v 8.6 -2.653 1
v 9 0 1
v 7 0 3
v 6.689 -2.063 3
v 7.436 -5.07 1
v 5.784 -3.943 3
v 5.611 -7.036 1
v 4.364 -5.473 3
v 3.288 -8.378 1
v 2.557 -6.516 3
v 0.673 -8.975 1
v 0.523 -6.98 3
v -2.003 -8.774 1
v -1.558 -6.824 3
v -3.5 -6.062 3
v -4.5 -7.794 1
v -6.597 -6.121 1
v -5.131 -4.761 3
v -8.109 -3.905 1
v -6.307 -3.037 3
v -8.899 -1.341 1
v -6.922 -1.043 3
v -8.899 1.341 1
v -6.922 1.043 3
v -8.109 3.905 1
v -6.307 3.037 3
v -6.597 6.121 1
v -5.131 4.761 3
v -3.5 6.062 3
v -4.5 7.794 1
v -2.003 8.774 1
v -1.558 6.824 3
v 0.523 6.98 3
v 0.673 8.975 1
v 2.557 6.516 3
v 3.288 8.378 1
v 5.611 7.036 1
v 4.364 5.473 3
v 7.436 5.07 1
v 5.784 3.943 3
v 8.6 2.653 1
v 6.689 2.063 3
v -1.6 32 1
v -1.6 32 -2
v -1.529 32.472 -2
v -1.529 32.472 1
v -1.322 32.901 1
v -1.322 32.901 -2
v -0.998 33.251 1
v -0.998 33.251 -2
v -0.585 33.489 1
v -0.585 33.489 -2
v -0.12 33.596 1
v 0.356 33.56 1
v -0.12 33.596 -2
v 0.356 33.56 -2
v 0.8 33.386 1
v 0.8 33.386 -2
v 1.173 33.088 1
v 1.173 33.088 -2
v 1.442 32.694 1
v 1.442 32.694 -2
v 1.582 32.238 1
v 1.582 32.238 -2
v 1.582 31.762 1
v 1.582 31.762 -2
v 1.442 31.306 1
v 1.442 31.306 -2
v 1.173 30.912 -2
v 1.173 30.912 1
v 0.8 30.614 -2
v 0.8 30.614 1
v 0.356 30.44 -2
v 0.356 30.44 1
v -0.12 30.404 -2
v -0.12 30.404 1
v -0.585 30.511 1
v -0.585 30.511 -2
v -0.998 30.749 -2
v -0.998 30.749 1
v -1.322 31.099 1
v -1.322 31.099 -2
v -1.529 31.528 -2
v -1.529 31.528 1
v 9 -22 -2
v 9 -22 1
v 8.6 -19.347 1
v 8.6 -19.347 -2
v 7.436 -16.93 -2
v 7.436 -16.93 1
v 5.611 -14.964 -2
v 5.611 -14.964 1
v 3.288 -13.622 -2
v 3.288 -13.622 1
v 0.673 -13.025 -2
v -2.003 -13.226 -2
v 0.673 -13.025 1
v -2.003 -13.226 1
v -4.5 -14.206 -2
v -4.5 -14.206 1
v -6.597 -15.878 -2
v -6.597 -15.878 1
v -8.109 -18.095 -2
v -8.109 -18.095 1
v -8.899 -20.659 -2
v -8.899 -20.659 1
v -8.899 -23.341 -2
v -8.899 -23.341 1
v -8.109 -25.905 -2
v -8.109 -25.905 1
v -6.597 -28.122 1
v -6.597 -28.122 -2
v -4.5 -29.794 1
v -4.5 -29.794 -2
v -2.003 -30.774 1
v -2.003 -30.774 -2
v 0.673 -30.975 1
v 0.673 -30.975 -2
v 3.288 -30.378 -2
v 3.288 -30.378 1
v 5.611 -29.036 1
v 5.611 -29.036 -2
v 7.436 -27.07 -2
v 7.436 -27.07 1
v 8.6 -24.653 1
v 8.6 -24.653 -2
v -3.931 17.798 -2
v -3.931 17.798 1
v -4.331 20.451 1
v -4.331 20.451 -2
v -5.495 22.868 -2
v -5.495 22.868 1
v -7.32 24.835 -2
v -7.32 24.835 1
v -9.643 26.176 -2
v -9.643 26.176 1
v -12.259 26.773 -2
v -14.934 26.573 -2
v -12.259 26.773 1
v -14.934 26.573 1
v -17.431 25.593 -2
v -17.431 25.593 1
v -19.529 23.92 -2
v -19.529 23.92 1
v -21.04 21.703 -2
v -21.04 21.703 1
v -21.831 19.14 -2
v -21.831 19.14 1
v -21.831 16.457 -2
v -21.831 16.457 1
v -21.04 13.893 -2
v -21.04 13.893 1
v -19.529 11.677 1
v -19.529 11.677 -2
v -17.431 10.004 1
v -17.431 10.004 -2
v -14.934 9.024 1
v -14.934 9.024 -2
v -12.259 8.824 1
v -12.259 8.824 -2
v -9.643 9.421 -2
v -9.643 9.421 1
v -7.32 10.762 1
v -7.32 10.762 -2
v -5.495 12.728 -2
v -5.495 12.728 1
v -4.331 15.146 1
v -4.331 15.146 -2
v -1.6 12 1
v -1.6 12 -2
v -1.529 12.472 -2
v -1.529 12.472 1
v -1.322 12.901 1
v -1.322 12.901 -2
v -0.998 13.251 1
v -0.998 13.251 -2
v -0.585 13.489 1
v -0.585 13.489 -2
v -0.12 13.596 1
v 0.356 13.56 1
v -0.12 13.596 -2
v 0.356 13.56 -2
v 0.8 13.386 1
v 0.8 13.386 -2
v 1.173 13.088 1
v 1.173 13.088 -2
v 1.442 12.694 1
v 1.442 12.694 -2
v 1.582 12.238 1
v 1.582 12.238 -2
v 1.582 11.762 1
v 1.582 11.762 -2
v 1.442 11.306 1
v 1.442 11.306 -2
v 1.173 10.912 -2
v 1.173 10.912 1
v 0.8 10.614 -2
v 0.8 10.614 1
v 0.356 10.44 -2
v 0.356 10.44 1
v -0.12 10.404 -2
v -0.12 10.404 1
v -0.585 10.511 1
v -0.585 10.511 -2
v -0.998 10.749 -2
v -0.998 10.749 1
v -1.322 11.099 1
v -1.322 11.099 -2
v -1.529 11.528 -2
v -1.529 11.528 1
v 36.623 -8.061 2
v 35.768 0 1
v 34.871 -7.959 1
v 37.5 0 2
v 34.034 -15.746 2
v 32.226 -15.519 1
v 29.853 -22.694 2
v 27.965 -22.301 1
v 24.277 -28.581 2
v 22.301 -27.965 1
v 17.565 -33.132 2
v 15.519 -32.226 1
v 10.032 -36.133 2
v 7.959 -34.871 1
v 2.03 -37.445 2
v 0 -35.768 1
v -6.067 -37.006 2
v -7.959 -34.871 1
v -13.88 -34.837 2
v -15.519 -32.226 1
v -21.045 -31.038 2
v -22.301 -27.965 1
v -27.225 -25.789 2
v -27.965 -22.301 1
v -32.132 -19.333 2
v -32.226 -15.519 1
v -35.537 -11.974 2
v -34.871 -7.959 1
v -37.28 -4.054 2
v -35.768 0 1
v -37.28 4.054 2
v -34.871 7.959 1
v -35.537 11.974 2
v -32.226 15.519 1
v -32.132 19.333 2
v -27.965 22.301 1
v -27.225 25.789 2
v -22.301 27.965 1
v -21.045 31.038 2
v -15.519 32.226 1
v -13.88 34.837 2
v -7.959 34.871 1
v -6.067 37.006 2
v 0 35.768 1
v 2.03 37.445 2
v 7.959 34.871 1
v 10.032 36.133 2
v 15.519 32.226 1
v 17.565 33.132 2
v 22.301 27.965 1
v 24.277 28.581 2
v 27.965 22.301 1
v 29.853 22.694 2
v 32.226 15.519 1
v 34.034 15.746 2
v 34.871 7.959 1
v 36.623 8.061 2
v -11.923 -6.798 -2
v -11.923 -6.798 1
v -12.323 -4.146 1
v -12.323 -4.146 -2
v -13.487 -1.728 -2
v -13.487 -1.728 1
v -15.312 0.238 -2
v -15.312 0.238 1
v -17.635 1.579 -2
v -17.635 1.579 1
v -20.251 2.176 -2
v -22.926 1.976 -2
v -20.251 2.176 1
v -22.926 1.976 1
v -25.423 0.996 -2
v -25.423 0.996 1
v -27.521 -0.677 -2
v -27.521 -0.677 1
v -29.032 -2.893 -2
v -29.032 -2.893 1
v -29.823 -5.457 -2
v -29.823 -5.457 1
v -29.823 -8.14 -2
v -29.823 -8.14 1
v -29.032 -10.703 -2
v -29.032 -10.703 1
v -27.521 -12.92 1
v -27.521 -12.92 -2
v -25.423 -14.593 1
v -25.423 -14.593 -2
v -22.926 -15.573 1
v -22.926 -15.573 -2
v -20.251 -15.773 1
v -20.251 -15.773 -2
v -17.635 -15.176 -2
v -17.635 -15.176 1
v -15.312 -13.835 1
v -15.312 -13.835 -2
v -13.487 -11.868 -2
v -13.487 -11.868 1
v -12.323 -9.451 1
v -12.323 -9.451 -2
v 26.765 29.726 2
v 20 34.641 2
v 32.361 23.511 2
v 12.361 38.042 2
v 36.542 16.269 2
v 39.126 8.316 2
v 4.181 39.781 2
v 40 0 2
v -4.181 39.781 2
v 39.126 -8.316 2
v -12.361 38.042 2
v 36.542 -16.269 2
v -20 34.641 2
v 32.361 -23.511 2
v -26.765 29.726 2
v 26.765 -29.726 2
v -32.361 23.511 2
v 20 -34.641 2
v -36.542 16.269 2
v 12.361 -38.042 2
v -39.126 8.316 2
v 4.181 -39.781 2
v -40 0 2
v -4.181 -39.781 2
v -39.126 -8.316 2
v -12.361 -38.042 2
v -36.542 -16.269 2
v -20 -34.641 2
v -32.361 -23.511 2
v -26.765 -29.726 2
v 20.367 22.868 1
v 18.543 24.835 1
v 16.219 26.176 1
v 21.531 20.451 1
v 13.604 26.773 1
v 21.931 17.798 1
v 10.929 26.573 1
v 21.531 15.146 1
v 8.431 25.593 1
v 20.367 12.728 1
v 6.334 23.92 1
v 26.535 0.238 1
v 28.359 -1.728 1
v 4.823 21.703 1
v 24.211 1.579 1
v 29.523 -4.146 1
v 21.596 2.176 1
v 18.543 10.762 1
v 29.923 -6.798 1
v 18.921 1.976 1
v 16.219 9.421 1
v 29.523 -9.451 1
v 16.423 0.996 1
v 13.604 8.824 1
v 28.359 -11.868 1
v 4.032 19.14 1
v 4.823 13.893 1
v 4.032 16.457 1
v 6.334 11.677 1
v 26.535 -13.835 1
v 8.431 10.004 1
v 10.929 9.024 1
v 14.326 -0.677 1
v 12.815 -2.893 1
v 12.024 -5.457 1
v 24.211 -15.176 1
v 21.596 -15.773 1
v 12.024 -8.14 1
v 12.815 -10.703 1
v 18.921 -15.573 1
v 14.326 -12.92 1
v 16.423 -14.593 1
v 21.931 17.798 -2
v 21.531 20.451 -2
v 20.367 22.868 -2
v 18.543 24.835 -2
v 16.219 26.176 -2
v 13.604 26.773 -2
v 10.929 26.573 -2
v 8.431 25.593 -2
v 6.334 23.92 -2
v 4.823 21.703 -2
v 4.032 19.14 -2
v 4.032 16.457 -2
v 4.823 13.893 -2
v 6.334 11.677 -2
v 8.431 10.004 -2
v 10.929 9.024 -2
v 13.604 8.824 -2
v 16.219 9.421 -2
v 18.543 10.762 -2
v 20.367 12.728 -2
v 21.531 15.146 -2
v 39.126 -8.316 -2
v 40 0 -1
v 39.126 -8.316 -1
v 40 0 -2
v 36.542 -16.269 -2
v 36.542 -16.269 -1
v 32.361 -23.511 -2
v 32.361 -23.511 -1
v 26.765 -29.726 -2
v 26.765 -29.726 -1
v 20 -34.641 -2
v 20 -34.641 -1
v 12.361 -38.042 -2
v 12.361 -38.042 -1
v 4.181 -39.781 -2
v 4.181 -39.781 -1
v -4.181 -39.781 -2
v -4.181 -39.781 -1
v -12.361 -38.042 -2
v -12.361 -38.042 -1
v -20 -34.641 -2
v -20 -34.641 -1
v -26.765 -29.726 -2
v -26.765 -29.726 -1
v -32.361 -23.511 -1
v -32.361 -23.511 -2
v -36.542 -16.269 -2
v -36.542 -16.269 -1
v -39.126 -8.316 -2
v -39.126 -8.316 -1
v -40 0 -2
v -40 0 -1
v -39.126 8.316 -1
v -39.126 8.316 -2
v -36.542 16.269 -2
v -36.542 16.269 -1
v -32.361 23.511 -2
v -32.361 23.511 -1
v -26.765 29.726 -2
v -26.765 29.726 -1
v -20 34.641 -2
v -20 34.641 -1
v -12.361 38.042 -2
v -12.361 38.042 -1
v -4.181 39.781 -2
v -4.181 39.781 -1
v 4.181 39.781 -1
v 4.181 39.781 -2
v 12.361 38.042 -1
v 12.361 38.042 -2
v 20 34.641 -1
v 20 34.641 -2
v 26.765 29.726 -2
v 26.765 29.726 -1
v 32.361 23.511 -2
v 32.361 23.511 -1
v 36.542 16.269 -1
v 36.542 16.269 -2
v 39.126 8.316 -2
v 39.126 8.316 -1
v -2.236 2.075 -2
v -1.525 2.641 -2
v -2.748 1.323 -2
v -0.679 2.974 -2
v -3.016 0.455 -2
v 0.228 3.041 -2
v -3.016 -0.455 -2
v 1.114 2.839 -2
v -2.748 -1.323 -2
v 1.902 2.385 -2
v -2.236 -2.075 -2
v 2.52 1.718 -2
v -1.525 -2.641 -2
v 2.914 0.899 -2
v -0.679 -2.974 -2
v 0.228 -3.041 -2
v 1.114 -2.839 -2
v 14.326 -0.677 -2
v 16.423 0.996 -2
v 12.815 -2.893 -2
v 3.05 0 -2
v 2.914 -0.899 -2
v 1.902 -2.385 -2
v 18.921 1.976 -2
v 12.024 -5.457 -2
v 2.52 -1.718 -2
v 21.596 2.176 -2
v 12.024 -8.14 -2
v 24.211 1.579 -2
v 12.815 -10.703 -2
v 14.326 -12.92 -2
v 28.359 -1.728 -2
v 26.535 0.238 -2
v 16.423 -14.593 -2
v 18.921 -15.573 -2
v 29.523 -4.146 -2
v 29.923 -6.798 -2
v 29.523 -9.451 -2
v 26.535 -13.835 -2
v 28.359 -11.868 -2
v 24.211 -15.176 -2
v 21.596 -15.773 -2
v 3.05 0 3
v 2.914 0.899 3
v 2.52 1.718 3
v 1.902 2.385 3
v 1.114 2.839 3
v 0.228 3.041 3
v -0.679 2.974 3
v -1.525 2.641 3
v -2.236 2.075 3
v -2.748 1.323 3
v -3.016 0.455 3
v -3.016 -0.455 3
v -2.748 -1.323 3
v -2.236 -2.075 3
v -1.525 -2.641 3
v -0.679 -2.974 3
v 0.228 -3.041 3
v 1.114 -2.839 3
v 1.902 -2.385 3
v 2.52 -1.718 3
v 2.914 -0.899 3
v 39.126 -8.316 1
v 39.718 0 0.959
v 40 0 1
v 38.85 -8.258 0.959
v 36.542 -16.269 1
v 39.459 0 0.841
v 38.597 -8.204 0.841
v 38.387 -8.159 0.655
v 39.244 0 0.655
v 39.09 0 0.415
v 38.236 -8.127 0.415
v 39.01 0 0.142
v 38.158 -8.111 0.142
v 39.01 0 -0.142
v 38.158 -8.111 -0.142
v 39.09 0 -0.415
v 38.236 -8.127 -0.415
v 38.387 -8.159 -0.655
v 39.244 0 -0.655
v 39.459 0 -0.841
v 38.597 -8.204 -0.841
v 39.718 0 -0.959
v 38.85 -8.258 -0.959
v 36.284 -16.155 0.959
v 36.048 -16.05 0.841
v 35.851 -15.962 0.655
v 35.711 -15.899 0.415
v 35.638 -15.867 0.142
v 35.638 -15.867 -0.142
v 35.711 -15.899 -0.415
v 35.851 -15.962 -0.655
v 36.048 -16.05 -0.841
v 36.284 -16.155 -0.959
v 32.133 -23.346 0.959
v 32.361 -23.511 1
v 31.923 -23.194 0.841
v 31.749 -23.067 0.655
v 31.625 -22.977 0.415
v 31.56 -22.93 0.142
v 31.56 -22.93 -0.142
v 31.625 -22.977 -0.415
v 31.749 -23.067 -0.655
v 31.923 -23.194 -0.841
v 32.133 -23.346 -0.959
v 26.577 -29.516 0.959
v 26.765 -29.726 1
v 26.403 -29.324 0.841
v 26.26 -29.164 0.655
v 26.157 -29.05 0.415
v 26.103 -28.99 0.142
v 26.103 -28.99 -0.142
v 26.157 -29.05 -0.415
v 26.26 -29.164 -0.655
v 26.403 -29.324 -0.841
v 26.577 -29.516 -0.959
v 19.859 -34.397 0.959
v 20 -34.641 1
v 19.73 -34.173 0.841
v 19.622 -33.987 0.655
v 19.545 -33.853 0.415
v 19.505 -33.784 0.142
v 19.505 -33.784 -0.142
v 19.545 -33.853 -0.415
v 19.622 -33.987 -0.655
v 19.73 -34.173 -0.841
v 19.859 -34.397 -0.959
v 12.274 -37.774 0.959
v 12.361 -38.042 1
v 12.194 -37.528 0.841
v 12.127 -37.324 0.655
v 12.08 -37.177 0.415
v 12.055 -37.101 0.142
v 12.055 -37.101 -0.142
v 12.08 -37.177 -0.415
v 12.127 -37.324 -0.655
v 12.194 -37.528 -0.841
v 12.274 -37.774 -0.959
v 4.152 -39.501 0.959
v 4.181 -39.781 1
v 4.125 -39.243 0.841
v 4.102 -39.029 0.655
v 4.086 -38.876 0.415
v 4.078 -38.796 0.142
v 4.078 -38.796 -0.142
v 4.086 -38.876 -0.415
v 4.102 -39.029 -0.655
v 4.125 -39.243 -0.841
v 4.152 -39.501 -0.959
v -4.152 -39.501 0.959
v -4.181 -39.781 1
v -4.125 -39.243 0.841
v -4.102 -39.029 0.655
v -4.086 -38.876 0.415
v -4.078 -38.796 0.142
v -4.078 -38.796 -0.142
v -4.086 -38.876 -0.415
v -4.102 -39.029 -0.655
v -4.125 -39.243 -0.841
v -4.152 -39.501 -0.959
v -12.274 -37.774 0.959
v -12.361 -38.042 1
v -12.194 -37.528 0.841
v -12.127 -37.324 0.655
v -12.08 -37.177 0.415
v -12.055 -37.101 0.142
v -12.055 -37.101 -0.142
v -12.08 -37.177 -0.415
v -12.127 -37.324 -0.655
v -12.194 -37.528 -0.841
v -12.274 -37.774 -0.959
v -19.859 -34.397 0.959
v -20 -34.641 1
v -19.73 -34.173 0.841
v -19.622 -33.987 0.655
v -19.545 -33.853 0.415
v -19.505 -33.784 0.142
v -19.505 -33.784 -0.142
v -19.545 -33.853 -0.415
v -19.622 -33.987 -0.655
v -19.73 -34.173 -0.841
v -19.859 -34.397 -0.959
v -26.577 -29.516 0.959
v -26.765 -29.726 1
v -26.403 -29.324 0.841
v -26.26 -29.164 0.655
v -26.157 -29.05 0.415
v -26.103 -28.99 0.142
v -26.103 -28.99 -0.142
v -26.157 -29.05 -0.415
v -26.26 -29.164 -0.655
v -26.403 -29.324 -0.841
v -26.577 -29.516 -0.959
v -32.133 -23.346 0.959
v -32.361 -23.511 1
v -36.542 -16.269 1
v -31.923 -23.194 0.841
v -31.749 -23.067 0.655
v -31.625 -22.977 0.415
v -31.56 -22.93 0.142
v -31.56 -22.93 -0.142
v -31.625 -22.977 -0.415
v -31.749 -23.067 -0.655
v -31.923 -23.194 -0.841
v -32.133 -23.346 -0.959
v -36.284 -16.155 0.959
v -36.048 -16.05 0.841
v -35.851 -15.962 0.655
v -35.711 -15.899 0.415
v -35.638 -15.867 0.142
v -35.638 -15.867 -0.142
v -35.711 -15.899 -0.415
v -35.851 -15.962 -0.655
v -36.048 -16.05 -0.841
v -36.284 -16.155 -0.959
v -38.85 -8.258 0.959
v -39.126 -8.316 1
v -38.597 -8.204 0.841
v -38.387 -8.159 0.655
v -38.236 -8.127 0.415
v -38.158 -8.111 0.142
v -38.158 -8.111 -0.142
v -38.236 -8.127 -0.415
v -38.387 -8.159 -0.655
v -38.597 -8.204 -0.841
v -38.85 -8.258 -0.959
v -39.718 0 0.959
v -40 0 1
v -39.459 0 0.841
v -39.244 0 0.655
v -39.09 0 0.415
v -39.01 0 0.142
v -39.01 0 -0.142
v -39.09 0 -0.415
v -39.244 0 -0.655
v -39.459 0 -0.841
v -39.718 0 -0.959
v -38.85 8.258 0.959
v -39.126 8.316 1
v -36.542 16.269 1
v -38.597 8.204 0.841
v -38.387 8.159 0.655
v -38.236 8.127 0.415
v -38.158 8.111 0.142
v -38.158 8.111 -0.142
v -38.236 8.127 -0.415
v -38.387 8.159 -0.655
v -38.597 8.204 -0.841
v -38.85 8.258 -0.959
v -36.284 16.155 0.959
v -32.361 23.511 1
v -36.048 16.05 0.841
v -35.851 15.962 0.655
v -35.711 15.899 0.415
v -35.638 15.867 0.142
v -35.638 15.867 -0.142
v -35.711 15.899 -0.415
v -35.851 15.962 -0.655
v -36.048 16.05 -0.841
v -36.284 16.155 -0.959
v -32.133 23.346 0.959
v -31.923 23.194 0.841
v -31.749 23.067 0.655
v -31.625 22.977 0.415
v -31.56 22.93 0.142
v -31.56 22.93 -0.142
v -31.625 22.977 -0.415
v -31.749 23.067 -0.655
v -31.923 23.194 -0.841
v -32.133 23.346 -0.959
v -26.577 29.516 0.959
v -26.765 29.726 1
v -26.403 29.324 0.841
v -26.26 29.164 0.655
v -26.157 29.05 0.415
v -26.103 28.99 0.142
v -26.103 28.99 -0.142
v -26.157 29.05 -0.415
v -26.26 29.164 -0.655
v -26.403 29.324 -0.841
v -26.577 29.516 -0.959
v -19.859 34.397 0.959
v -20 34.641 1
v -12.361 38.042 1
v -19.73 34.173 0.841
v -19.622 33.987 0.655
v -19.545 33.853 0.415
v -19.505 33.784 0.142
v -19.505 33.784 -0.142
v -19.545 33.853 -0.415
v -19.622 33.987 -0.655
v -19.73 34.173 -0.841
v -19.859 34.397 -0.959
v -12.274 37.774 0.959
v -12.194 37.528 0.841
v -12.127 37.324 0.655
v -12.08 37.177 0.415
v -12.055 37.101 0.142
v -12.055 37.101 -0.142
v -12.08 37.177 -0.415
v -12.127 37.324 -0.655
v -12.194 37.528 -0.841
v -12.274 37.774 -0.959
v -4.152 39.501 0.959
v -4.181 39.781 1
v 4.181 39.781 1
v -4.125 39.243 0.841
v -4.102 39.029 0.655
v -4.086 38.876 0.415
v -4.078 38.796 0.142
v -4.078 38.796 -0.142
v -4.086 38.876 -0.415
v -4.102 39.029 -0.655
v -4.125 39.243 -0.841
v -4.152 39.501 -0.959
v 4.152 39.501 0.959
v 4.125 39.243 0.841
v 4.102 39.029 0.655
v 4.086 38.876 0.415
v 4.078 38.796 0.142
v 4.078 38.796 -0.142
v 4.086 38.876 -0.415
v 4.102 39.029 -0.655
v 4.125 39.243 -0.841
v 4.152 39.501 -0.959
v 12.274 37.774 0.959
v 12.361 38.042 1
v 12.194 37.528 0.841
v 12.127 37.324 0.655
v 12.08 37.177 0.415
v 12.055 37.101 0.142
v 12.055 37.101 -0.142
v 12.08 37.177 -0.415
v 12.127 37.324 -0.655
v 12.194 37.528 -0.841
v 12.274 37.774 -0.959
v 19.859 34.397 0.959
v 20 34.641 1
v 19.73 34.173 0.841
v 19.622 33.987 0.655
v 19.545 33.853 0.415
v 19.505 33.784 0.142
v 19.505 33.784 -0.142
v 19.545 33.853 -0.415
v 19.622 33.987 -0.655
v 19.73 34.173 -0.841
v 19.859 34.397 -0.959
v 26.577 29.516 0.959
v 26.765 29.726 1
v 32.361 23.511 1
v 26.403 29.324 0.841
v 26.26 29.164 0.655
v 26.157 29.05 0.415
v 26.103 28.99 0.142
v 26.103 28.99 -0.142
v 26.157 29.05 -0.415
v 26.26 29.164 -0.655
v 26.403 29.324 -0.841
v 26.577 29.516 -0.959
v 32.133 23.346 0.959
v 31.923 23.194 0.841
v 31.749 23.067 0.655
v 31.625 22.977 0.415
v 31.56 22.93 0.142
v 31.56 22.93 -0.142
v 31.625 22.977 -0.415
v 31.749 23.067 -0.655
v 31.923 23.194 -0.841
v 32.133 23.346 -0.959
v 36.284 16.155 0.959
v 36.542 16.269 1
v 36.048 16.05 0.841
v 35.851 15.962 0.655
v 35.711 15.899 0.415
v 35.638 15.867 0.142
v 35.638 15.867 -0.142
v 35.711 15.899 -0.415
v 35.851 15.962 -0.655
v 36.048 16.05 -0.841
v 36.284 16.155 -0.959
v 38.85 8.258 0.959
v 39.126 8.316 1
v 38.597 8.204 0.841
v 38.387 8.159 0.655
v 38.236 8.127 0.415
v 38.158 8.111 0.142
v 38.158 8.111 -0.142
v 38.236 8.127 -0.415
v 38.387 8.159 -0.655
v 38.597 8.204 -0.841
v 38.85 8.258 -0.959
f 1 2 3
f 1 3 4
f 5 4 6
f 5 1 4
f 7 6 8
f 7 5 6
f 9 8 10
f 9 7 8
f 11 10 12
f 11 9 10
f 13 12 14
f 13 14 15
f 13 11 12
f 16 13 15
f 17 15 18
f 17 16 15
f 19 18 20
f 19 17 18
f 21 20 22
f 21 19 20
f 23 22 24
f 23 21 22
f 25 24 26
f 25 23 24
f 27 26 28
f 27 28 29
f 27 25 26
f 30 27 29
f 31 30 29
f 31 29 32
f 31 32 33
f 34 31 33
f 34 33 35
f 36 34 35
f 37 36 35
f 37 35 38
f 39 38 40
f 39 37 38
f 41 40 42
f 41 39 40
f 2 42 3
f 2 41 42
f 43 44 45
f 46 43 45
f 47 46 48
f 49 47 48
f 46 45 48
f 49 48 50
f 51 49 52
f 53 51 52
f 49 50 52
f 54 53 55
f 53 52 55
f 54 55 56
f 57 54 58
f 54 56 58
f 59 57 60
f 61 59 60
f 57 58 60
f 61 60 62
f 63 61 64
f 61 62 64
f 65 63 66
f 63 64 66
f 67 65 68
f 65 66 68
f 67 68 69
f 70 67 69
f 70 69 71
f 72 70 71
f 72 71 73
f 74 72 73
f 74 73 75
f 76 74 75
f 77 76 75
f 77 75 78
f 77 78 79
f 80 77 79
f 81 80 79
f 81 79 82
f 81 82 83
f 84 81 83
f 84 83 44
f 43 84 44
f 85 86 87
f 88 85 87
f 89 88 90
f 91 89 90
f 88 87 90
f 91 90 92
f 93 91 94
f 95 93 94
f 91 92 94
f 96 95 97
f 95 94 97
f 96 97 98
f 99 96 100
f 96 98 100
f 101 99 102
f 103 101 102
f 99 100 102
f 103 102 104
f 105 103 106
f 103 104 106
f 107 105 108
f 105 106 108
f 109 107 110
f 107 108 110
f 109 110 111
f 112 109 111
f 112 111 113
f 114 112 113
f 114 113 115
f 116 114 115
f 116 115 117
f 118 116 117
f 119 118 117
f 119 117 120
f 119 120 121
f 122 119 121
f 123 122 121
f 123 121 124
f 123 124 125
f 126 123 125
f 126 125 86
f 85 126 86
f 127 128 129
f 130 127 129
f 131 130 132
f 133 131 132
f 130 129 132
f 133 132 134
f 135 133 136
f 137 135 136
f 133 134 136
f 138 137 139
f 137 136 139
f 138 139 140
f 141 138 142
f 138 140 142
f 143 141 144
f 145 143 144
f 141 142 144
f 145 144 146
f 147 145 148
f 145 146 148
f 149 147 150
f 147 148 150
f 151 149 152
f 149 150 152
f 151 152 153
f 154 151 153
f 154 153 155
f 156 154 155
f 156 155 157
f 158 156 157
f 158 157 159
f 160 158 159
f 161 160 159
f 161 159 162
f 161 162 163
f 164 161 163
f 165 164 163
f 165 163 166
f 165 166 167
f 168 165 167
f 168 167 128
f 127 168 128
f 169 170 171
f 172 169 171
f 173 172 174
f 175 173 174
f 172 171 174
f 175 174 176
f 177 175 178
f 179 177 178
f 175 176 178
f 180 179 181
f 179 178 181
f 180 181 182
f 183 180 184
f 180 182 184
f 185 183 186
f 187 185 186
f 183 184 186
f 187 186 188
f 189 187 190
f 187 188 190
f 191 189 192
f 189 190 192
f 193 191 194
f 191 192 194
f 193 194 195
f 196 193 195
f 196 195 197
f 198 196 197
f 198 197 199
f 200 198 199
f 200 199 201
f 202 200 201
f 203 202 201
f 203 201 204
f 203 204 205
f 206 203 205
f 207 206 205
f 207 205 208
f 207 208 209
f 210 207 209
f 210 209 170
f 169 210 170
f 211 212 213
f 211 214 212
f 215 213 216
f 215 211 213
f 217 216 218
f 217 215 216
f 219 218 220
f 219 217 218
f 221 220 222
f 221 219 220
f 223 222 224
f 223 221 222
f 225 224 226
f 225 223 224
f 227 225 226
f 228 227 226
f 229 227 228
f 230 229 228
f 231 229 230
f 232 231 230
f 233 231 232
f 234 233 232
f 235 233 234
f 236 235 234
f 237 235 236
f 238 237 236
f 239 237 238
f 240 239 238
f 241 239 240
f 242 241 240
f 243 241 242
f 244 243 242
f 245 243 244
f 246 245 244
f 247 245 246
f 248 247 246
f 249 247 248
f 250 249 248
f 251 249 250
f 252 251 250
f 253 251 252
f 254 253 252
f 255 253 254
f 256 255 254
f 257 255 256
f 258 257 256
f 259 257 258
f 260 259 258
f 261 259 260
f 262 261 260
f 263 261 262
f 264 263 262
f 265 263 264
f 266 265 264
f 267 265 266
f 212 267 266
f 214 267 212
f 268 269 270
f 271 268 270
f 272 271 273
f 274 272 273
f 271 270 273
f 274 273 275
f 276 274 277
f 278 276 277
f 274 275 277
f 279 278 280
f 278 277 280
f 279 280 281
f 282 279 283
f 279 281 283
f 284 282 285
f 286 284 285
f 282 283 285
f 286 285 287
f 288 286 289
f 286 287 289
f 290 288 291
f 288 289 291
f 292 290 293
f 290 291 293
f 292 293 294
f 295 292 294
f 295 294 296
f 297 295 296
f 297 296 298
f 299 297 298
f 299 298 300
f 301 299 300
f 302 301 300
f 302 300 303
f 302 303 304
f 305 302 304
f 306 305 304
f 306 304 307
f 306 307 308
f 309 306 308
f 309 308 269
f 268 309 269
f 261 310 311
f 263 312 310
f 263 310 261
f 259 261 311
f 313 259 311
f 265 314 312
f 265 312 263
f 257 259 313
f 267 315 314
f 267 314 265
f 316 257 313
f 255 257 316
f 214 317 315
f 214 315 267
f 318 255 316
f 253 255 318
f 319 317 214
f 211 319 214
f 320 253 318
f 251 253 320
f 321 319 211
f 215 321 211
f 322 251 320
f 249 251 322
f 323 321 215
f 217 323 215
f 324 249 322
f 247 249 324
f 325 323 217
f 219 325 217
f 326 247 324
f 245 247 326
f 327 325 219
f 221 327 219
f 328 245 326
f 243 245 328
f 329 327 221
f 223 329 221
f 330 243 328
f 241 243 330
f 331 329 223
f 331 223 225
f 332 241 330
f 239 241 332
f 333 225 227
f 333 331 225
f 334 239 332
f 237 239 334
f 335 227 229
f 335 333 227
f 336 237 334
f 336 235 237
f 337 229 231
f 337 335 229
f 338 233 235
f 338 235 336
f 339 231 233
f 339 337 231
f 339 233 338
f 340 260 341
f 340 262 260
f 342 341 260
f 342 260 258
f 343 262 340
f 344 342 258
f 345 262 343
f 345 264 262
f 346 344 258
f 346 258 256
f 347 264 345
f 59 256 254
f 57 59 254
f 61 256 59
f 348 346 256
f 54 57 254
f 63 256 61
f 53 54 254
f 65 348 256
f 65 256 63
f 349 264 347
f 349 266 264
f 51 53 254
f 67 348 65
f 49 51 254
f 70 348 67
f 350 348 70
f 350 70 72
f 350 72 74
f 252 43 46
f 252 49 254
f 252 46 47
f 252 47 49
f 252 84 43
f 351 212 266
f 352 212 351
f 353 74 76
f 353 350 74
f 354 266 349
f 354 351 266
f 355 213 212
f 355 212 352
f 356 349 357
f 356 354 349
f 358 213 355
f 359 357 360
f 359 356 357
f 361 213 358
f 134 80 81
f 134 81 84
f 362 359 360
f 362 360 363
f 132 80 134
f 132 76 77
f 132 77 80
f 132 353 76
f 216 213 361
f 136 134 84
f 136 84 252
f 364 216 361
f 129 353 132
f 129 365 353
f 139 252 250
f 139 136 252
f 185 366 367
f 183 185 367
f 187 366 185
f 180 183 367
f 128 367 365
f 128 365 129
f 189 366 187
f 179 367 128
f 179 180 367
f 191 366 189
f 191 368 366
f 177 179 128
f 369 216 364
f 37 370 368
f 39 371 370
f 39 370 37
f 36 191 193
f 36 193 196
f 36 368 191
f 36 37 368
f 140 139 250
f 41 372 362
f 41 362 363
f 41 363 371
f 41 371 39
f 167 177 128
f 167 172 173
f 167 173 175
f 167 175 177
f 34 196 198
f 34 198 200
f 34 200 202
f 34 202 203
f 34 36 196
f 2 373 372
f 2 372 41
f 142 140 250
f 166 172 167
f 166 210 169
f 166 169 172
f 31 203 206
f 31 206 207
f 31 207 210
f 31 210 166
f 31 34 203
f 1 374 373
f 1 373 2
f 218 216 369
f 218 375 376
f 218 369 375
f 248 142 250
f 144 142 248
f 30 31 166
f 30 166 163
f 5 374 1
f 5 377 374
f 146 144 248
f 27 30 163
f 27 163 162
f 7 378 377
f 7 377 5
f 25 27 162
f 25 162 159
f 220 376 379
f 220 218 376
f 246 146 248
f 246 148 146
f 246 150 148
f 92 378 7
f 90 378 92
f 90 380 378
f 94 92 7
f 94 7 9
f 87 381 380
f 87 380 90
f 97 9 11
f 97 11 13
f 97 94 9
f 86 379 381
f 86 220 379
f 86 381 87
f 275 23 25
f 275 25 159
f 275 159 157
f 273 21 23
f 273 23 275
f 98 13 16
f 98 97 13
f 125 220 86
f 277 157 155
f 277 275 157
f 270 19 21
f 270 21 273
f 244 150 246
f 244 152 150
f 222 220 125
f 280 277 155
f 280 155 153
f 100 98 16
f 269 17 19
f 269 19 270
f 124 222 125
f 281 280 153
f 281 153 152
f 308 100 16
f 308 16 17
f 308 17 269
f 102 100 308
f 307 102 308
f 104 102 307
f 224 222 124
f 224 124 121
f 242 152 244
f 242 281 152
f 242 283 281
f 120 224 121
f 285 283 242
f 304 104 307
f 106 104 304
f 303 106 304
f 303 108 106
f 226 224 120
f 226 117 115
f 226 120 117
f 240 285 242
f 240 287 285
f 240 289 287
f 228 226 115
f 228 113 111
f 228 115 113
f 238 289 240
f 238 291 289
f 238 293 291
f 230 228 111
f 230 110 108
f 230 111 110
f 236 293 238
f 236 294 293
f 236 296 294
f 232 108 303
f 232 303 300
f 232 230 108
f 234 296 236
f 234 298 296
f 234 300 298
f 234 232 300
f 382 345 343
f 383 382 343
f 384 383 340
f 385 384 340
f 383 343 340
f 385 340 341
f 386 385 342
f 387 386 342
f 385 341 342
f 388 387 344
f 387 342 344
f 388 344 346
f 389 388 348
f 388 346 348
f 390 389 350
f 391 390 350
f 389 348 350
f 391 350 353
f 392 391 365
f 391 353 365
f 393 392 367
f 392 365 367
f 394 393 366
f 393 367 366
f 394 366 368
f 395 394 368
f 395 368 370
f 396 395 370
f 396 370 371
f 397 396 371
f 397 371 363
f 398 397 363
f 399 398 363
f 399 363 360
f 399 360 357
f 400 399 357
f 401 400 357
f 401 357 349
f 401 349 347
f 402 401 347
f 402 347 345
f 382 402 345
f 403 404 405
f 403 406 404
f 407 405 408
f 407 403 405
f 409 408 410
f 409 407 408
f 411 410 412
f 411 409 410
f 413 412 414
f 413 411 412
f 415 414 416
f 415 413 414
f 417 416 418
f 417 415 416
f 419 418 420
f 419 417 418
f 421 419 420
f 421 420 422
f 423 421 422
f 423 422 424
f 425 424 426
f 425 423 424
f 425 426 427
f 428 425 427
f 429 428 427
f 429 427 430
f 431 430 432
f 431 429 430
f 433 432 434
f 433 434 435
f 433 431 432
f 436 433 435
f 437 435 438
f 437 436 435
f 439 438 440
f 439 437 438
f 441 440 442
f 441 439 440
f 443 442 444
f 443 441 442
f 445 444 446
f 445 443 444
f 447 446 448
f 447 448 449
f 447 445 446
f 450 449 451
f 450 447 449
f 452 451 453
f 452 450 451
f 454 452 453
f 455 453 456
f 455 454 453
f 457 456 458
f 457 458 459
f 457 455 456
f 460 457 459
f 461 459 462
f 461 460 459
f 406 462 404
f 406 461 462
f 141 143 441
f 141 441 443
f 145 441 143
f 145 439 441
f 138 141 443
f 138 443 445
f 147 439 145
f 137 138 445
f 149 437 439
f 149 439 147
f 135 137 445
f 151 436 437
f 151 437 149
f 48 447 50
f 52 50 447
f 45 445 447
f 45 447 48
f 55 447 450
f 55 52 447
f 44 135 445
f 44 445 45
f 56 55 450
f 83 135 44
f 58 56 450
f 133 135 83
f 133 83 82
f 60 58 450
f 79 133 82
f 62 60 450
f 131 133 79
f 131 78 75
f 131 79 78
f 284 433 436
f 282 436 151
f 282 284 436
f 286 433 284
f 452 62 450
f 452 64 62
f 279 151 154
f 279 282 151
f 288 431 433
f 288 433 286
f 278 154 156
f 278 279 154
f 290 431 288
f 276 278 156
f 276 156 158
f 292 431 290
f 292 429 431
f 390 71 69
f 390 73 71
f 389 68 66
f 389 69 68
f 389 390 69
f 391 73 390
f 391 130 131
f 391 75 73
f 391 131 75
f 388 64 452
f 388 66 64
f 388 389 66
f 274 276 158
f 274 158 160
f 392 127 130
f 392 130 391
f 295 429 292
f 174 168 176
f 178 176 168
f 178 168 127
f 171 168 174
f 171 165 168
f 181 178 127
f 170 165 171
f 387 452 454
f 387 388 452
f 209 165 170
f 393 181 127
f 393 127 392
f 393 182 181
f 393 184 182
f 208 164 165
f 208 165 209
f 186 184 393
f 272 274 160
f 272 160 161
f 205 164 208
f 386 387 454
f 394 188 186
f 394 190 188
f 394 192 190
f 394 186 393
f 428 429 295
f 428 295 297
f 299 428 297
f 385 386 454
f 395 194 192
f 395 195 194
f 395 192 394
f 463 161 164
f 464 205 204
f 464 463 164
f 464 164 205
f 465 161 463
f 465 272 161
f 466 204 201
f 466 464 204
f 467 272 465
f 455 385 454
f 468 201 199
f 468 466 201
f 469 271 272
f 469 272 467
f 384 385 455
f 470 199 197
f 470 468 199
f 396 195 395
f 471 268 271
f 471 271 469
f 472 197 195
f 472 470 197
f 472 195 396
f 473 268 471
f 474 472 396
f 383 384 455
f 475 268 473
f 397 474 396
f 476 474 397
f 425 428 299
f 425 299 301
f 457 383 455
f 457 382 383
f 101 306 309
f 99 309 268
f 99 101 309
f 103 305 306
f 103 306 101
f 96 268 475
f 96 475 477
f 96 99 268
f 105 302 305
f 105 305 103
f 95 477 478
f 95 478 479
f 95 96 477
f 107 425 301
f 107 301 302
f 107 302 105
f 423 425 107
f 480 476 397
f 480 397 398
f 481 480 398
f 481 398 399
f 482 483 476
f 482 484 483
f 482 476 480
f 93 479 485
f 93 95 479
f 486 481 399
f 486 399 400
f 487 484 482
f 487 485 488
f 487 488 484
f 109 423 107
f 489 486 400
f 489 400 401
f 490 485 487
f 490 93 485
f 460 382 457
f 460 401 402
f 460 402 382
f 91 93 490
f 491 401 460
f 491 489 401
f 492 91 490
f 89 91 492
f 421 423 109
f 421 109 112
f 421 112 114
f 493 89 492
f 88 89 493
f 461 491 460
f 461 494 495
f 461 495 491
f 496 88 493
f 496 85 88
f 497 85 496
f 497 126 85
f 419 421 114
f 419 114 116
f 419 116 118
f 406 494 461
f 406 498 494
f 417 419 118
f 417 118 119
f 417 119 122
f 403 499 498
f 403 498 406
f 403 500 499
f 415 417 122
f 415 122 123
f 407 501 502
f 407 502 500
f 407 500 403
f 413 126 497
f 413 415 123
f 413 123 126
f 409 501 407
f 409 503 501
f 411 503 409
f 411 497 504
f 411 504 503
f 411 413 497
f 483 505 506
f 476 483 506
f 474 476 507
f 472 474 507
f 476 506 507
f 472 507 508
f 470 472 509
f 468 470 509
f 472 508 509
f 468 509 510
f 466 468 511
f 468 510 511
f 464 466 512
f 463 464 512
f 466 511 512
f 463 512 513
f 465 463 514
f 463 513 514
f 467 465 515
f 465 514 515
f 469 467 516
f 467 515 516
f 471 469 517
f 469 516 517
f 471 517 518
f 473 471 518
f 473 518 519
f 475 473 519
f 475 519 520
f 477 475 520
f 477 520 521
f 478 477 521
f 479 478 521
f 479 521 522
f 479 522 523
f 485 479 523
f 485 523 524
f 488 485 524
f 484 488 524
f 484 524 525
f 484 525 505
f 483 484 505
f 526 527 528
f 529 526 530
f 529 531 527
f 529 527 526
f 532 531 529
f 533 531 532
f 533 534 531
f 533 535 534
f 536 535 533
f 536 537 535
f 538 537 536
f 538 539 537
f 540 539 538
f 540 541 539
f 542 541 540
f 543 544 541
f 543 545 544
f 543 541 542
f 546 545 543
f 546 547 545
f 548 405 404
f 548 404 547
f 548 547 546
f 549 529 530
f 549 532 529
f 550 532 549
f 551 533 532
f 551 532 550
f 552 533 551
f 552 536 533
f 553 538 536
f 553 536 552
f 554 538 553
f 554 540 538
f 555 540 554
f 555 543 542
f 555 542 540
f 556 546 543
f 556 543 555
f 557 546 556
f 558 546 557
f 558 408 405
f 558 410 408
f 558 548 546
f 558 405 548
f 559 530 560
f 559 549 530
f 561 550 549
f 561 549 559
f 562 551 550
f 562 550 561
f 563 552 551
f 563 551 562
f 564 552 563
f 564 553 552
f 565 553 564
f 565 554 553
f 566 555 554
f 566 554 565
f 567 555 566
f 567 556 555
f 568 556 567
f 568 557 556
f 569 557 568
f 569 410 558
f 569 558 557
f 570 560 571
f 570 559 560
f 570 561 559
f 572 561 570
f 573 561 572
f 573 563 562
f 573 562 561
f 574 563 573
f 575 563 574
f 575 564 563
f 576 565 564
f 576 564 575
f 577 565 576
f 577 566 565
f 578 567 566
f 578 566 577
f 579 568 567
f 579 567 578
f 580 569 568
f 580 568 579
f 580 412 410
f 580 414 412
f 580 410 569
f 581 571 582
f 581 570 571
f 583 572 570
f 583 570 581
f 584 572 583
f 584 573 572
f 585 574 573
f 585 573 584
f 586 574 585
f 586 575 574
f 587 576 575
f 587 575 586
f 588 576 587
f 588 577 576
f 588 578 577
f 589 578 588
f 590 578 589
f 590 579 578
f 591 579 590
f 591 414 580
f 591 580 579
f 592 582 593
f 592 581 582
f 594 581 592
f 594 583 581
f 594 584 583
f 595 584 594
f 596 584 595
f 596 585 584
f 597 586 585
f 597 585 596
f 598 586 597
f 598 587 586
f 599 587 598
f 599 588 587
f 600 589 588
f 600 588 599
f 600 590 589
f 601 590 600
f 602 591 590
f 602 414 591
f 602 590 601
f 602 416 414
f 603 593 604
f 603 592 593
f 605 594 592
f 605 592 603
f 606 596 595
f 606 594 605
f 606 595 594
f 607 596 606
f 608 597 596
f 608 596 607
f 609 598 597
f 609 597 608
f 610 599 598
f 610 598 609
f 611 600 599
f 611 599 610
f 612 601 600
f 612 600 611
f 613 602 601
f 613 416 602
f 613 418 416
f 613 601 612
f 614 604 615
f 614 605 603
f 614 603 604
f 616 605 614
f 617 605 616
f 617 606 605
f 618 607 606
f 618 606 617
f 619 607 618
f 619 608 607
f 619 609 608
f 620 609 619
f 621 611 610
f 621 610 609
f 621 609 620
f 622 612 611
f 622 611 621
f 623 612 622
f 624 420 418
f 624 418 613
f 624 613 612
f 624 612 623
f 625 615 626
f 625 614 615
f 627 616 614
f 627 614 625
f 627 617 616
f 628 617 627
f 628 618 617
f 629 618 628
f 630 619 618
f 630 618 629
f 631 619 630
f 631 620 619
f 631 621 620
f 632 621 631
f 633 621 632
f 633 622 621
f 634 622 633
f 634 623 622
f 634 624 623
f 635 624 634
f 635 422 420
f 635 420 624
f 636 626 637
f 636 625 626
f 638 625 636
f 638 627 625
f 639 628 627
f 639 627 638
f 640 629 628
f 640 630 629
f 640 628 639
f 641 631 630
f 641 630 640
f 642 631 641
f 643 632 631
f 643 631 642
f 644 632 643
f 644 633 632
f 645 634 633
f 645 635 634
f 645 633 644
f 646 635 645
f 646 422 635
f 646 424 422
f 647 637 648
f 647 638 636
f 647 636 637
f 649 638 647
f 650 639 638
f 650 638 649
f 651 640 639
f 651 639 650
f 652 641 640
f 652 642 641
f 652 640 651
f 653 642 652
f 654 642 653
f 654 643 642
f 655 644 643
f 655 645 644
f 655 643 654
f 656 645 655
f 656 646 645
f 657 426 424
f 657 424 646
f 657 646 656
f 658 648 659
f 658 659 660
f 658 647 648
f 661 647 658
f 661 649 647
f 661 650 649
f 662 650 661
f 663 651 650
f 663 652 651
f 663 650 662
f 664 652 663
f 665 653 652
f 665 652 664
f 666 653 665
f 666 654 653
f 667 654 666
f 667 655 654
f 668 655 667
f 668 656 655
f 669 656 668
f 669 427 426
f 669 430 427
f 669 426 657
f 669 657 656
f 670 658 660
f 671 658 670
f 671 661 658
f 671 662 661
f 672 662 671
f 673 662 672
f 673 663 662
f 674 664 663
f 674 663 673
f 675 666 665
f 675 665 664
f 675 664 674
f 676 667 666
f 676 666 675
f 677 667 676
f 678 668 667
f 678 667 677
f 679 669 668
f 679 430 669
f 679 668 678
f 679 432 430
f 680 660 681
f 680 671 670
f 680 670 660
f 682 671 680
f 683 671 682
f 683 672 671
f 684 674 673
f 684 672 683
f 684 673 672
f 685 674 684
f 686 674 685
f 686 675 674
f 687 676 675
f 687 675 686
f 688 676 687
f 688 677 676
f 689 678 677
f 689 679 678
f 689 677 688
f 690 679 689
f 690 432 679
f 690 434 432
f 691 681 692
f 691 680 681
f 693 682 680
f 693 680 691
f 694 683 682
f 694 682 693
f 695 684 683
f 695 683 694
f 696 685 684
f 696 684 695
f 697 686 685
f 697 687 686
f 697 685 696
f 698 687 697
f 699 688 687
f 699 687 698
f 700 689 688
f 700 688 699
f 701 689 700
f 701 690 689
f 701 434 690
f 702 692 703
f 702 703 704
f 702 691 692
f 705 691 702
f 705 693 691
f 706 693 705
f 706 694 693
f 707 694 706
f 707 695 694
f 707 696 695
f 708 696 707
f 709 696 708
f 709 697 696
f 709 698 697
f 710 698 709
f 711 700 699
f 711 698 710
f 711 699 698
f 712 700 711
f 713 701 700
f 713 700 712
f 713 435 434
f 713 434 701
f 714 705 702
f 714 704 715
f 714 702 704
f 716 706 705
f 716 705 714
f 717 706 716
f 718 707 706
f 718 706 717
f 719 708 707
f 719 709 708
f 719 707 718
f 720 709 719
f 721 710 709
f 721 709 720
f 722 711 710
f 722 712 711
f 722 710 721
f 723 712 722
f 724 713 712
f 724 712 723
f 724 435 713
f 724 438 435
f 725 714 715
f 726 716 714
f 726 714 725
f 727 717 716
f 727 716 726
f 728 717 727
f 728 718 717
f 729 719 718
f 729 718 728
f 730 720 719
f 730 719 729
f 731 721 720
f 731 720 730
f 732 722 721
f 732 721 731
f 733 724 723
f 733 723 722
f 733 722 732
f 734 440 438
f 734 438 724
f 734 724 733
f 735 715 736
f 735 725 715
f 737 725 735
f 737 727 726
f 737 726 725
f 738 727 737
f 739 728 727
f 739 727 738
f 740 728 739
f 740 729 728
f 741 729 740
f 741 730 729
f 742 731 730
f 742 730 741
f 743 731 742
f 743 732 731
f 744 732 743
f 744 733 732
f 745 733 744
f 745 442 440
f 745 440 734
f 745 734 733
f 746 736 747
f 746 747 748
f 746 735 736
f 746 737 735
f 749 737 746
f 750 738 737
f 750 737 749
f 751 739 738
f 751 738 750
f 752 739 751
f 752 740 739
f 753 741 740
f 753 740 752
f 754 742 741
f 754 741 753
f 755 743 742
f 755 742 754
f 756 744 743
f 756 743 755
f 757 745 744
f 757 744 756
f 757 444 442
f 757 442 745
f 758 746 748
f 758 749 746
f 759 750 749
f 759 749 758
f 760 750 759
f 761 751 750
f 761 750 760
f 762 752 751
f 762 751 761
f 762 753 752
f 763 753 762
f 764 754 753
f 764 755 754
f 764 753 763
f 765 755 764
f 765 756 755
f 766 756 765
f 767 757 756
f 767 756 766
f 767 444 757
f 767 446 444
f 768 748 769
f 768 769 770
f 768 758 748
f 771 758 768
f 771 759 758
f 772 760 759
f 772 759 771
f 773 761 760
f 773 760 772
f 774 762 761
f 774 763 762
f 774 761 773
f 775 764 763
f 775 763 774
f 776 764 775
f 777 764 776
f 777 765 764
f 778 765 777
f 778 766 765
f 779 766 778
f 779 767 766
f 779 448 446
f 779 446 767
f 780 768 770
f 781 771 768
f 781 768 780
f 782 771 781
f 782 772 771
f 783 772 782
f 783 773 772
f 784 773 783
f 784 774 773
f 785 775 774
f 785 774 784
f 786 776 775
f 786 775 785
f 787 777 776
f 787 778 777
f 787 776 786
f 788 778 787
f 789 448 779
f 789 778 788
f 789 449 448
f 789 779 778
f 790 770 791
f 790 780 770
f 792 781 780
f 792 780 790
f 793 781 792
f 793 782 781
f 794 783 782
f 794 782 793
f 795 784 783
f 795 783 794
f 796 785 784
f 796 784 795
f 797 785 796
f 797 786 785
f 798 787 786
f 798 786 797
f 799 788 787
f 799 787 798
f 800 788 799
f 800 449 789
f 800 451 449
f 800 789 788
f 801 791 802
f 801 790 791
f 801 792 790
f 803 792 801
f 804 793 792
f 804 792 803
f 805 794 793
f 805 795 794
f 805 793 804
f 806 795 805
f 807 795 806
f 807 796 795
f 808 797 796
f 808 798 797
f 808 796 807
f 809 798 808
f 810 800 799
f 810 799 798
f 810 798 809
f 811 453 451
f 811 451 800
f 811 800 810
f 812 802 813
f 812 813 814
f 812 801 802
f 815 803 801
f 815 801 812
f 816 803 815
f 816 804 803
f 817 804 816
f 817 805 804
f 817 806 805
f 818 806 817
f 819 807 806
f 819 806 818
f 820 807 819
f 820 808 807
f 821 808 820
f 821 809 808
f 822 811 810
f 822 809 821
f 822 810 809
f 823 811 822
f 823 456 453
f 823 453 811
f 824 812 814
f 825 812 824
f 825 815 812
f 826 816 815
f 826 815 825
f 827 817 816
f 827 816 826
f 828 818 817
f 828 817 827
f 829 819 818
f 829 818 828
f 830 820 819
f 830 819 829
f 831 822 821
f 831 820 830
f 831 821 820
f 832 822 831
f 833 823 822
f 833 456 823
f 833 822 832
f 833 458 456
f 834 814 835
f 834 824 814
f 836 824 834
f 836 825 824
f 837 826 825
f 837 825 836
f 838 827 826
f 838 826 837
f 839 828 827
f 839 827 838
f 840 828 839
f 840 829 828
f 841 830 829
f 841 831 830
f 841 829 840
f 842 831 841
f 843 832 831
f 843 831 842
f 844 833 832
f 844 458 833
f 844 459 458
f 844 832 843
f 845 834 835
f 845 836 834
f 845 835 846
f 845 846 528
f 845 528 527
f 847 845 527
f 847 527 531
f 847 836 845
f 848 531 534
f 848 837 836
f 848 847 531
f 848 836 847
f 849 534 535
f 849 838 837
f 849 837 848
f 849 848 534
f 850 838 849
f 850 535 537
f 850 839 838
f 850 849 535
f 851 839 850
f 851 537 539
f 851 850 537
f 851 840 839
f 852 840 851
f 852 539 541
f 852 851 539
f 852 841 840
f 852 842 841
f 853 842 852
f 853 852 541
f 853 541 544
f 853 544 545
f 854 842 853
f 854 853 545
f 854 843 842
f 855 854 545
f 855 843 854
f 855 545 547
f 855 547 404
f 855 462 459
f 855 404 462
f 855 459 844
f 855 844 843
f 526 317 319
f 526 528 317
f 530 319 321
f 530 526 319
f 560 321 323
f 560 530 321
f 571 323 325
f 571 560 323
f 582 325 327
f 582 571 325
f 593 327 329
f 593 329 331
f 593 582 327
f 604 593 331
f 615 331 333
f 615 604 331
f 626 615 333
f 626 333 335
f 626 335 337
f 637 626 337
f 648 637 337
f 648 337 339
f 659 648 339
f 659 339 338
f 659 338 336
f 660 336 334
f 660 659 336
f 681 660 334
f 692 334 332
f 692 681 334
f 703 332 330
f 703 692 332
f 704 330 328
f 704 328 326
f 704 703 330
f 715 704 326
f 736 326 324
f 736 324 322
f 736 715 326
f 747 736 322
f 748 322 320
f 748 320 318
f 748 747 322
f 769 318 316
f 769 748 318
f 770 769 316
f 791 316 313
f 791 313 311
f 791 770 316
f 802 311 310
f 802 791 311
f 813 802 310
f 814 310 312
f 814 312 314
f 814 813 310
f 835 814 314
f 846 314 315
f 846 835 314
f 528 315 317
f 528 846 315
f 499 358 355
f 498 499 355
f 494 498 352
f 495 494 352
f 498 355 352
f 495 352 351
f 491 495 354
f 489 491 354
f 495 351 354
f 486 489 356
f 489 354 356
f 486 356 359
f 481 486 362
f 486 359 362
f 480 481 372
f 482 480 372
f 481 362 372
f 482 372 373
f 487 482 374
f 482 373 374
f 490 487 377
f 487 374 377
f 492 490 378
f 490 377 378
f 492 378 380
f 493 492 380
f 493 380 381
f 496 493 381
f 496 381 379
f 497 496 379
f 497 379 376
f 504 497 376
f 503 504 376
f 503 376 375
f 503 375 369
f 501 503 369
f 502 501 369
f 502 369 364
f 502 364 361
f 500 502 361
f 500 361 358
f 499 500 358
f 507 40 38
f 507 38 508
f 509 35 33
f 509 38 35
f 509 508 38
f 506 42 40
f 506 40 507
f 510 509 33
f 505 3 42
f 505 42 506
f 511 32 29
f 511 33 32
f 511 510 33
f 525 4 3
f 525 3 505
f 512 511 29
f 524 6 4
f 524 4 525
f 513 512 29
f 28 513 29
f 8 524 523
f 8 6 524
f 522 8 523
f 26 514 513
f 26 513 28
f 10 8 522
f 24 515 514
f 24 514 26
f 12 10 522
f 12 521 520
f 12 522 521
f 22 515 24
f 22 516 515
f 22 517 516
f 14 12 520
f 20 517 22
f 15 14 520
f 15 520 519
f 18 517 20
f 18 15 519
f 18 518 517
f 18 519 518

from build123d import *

# Parameters (mm, degrees)
SKETCH2_W          = 7
SKETCH2_H          = 1
SKETCH3_R          = 3.05
CUT_EXTRUDE1_DEPTH = 57.789083458
CHAMFER1_SIZE      = 2
SKETCH4_R          = 9
CUT_EXTRUDE2_DEPTH = 57.648036153
SKETCH5_R          = 1.6
CUT_EXTRUDE3_DEPTH = 57.789083458


with BuildPart() as part:
    # Sketch2 → Revolve1 (revolve)
    with BuildSketch(Plane(origin=(0, 0, 0), x_dir=(1, 0, 0), z_dir=(0, 1, 0))):
        with Locations((3.5, -2.5)):
            Rectangle(SKETCH2_W, SKETCH2_H)
        with BuildLine():
            Line((0, 2), (0, -2))
            Line((0, -2), (7, -2))
            Line((7, -2), (7, -1))
            Line((7, -1), (35.767949192, -1))
            Line((35.767949192, -1), (37.5, -2))
            Line((37.5, -2), (40, -2))
            Line((40, -2), (40, -1))
            ThreePointArc((40, -1), (39, 0), (40, 1))
            Line((40, 1), (40, 2))
            Line((40, 2), (0, 2))
        make_face()
    revolve(axis=Axis((0, 0, 2), (0, 0, -1)))

    # Sketch3 → Cut-Extrude1 (cut, through all)
    with BuildSketch(Plane.XY.offset(3)):
        Circle(SKETCH3_R)
    extrude(amount=-CUT_EXTRUDE1_DEPTH, mode=Mode.SUBTRACT)

    # Chamfer1
    chamfer1_edges = [part.edges().sort_by_distance(p)[0] for p in [
        (-7, 0, 1),
    ]]
    chamfer(chamfer1_edges, length=CHAMFER1_SIZE - 0.0001)  # a hair under: the kernel refuses the full size

    # Sketch4 → Cut-Extrude2 (cut, through all)
    with BuildSketch(Plane.XY.offset(1)):
        with Locations((0, -22)):
            Circle(SKETCH4_R)
        with Locations((-20.923243358, -6.798373876)):
            Circle(SKETCH4_R)
        with Locations((-12.93127555, 17.798373876)):
            Circle(SKETCH4_R)
        with Locations((12.93127555, 17.798373876)):
            Circle(SKETCH4_R)
        with Locations((20.923243358, -6.798373876)):
            Circle(SKETCH4_R)
    extrude(amount=-CUT_EXTRUDE2_DEPTH, mode=Mode.SUBTRACT)

    # Sketch5 → Cut-Extrude3 (cut, through all)
    with BuildSketch(Plane(origin=(0, 0, -2), x_dir=(-1, 0, 0), z_dir=(0, 0, -1))):
        with Locations((0, 12)):
            Circle(SKETCH5_R)
        with Locations((0, 32)):
            Circle(SKETCH5_R)
    extrude(amount=-CUT_EXTRUDE3_DEPTH, mode=Mode.SUBTRACT)


solid = part.part
